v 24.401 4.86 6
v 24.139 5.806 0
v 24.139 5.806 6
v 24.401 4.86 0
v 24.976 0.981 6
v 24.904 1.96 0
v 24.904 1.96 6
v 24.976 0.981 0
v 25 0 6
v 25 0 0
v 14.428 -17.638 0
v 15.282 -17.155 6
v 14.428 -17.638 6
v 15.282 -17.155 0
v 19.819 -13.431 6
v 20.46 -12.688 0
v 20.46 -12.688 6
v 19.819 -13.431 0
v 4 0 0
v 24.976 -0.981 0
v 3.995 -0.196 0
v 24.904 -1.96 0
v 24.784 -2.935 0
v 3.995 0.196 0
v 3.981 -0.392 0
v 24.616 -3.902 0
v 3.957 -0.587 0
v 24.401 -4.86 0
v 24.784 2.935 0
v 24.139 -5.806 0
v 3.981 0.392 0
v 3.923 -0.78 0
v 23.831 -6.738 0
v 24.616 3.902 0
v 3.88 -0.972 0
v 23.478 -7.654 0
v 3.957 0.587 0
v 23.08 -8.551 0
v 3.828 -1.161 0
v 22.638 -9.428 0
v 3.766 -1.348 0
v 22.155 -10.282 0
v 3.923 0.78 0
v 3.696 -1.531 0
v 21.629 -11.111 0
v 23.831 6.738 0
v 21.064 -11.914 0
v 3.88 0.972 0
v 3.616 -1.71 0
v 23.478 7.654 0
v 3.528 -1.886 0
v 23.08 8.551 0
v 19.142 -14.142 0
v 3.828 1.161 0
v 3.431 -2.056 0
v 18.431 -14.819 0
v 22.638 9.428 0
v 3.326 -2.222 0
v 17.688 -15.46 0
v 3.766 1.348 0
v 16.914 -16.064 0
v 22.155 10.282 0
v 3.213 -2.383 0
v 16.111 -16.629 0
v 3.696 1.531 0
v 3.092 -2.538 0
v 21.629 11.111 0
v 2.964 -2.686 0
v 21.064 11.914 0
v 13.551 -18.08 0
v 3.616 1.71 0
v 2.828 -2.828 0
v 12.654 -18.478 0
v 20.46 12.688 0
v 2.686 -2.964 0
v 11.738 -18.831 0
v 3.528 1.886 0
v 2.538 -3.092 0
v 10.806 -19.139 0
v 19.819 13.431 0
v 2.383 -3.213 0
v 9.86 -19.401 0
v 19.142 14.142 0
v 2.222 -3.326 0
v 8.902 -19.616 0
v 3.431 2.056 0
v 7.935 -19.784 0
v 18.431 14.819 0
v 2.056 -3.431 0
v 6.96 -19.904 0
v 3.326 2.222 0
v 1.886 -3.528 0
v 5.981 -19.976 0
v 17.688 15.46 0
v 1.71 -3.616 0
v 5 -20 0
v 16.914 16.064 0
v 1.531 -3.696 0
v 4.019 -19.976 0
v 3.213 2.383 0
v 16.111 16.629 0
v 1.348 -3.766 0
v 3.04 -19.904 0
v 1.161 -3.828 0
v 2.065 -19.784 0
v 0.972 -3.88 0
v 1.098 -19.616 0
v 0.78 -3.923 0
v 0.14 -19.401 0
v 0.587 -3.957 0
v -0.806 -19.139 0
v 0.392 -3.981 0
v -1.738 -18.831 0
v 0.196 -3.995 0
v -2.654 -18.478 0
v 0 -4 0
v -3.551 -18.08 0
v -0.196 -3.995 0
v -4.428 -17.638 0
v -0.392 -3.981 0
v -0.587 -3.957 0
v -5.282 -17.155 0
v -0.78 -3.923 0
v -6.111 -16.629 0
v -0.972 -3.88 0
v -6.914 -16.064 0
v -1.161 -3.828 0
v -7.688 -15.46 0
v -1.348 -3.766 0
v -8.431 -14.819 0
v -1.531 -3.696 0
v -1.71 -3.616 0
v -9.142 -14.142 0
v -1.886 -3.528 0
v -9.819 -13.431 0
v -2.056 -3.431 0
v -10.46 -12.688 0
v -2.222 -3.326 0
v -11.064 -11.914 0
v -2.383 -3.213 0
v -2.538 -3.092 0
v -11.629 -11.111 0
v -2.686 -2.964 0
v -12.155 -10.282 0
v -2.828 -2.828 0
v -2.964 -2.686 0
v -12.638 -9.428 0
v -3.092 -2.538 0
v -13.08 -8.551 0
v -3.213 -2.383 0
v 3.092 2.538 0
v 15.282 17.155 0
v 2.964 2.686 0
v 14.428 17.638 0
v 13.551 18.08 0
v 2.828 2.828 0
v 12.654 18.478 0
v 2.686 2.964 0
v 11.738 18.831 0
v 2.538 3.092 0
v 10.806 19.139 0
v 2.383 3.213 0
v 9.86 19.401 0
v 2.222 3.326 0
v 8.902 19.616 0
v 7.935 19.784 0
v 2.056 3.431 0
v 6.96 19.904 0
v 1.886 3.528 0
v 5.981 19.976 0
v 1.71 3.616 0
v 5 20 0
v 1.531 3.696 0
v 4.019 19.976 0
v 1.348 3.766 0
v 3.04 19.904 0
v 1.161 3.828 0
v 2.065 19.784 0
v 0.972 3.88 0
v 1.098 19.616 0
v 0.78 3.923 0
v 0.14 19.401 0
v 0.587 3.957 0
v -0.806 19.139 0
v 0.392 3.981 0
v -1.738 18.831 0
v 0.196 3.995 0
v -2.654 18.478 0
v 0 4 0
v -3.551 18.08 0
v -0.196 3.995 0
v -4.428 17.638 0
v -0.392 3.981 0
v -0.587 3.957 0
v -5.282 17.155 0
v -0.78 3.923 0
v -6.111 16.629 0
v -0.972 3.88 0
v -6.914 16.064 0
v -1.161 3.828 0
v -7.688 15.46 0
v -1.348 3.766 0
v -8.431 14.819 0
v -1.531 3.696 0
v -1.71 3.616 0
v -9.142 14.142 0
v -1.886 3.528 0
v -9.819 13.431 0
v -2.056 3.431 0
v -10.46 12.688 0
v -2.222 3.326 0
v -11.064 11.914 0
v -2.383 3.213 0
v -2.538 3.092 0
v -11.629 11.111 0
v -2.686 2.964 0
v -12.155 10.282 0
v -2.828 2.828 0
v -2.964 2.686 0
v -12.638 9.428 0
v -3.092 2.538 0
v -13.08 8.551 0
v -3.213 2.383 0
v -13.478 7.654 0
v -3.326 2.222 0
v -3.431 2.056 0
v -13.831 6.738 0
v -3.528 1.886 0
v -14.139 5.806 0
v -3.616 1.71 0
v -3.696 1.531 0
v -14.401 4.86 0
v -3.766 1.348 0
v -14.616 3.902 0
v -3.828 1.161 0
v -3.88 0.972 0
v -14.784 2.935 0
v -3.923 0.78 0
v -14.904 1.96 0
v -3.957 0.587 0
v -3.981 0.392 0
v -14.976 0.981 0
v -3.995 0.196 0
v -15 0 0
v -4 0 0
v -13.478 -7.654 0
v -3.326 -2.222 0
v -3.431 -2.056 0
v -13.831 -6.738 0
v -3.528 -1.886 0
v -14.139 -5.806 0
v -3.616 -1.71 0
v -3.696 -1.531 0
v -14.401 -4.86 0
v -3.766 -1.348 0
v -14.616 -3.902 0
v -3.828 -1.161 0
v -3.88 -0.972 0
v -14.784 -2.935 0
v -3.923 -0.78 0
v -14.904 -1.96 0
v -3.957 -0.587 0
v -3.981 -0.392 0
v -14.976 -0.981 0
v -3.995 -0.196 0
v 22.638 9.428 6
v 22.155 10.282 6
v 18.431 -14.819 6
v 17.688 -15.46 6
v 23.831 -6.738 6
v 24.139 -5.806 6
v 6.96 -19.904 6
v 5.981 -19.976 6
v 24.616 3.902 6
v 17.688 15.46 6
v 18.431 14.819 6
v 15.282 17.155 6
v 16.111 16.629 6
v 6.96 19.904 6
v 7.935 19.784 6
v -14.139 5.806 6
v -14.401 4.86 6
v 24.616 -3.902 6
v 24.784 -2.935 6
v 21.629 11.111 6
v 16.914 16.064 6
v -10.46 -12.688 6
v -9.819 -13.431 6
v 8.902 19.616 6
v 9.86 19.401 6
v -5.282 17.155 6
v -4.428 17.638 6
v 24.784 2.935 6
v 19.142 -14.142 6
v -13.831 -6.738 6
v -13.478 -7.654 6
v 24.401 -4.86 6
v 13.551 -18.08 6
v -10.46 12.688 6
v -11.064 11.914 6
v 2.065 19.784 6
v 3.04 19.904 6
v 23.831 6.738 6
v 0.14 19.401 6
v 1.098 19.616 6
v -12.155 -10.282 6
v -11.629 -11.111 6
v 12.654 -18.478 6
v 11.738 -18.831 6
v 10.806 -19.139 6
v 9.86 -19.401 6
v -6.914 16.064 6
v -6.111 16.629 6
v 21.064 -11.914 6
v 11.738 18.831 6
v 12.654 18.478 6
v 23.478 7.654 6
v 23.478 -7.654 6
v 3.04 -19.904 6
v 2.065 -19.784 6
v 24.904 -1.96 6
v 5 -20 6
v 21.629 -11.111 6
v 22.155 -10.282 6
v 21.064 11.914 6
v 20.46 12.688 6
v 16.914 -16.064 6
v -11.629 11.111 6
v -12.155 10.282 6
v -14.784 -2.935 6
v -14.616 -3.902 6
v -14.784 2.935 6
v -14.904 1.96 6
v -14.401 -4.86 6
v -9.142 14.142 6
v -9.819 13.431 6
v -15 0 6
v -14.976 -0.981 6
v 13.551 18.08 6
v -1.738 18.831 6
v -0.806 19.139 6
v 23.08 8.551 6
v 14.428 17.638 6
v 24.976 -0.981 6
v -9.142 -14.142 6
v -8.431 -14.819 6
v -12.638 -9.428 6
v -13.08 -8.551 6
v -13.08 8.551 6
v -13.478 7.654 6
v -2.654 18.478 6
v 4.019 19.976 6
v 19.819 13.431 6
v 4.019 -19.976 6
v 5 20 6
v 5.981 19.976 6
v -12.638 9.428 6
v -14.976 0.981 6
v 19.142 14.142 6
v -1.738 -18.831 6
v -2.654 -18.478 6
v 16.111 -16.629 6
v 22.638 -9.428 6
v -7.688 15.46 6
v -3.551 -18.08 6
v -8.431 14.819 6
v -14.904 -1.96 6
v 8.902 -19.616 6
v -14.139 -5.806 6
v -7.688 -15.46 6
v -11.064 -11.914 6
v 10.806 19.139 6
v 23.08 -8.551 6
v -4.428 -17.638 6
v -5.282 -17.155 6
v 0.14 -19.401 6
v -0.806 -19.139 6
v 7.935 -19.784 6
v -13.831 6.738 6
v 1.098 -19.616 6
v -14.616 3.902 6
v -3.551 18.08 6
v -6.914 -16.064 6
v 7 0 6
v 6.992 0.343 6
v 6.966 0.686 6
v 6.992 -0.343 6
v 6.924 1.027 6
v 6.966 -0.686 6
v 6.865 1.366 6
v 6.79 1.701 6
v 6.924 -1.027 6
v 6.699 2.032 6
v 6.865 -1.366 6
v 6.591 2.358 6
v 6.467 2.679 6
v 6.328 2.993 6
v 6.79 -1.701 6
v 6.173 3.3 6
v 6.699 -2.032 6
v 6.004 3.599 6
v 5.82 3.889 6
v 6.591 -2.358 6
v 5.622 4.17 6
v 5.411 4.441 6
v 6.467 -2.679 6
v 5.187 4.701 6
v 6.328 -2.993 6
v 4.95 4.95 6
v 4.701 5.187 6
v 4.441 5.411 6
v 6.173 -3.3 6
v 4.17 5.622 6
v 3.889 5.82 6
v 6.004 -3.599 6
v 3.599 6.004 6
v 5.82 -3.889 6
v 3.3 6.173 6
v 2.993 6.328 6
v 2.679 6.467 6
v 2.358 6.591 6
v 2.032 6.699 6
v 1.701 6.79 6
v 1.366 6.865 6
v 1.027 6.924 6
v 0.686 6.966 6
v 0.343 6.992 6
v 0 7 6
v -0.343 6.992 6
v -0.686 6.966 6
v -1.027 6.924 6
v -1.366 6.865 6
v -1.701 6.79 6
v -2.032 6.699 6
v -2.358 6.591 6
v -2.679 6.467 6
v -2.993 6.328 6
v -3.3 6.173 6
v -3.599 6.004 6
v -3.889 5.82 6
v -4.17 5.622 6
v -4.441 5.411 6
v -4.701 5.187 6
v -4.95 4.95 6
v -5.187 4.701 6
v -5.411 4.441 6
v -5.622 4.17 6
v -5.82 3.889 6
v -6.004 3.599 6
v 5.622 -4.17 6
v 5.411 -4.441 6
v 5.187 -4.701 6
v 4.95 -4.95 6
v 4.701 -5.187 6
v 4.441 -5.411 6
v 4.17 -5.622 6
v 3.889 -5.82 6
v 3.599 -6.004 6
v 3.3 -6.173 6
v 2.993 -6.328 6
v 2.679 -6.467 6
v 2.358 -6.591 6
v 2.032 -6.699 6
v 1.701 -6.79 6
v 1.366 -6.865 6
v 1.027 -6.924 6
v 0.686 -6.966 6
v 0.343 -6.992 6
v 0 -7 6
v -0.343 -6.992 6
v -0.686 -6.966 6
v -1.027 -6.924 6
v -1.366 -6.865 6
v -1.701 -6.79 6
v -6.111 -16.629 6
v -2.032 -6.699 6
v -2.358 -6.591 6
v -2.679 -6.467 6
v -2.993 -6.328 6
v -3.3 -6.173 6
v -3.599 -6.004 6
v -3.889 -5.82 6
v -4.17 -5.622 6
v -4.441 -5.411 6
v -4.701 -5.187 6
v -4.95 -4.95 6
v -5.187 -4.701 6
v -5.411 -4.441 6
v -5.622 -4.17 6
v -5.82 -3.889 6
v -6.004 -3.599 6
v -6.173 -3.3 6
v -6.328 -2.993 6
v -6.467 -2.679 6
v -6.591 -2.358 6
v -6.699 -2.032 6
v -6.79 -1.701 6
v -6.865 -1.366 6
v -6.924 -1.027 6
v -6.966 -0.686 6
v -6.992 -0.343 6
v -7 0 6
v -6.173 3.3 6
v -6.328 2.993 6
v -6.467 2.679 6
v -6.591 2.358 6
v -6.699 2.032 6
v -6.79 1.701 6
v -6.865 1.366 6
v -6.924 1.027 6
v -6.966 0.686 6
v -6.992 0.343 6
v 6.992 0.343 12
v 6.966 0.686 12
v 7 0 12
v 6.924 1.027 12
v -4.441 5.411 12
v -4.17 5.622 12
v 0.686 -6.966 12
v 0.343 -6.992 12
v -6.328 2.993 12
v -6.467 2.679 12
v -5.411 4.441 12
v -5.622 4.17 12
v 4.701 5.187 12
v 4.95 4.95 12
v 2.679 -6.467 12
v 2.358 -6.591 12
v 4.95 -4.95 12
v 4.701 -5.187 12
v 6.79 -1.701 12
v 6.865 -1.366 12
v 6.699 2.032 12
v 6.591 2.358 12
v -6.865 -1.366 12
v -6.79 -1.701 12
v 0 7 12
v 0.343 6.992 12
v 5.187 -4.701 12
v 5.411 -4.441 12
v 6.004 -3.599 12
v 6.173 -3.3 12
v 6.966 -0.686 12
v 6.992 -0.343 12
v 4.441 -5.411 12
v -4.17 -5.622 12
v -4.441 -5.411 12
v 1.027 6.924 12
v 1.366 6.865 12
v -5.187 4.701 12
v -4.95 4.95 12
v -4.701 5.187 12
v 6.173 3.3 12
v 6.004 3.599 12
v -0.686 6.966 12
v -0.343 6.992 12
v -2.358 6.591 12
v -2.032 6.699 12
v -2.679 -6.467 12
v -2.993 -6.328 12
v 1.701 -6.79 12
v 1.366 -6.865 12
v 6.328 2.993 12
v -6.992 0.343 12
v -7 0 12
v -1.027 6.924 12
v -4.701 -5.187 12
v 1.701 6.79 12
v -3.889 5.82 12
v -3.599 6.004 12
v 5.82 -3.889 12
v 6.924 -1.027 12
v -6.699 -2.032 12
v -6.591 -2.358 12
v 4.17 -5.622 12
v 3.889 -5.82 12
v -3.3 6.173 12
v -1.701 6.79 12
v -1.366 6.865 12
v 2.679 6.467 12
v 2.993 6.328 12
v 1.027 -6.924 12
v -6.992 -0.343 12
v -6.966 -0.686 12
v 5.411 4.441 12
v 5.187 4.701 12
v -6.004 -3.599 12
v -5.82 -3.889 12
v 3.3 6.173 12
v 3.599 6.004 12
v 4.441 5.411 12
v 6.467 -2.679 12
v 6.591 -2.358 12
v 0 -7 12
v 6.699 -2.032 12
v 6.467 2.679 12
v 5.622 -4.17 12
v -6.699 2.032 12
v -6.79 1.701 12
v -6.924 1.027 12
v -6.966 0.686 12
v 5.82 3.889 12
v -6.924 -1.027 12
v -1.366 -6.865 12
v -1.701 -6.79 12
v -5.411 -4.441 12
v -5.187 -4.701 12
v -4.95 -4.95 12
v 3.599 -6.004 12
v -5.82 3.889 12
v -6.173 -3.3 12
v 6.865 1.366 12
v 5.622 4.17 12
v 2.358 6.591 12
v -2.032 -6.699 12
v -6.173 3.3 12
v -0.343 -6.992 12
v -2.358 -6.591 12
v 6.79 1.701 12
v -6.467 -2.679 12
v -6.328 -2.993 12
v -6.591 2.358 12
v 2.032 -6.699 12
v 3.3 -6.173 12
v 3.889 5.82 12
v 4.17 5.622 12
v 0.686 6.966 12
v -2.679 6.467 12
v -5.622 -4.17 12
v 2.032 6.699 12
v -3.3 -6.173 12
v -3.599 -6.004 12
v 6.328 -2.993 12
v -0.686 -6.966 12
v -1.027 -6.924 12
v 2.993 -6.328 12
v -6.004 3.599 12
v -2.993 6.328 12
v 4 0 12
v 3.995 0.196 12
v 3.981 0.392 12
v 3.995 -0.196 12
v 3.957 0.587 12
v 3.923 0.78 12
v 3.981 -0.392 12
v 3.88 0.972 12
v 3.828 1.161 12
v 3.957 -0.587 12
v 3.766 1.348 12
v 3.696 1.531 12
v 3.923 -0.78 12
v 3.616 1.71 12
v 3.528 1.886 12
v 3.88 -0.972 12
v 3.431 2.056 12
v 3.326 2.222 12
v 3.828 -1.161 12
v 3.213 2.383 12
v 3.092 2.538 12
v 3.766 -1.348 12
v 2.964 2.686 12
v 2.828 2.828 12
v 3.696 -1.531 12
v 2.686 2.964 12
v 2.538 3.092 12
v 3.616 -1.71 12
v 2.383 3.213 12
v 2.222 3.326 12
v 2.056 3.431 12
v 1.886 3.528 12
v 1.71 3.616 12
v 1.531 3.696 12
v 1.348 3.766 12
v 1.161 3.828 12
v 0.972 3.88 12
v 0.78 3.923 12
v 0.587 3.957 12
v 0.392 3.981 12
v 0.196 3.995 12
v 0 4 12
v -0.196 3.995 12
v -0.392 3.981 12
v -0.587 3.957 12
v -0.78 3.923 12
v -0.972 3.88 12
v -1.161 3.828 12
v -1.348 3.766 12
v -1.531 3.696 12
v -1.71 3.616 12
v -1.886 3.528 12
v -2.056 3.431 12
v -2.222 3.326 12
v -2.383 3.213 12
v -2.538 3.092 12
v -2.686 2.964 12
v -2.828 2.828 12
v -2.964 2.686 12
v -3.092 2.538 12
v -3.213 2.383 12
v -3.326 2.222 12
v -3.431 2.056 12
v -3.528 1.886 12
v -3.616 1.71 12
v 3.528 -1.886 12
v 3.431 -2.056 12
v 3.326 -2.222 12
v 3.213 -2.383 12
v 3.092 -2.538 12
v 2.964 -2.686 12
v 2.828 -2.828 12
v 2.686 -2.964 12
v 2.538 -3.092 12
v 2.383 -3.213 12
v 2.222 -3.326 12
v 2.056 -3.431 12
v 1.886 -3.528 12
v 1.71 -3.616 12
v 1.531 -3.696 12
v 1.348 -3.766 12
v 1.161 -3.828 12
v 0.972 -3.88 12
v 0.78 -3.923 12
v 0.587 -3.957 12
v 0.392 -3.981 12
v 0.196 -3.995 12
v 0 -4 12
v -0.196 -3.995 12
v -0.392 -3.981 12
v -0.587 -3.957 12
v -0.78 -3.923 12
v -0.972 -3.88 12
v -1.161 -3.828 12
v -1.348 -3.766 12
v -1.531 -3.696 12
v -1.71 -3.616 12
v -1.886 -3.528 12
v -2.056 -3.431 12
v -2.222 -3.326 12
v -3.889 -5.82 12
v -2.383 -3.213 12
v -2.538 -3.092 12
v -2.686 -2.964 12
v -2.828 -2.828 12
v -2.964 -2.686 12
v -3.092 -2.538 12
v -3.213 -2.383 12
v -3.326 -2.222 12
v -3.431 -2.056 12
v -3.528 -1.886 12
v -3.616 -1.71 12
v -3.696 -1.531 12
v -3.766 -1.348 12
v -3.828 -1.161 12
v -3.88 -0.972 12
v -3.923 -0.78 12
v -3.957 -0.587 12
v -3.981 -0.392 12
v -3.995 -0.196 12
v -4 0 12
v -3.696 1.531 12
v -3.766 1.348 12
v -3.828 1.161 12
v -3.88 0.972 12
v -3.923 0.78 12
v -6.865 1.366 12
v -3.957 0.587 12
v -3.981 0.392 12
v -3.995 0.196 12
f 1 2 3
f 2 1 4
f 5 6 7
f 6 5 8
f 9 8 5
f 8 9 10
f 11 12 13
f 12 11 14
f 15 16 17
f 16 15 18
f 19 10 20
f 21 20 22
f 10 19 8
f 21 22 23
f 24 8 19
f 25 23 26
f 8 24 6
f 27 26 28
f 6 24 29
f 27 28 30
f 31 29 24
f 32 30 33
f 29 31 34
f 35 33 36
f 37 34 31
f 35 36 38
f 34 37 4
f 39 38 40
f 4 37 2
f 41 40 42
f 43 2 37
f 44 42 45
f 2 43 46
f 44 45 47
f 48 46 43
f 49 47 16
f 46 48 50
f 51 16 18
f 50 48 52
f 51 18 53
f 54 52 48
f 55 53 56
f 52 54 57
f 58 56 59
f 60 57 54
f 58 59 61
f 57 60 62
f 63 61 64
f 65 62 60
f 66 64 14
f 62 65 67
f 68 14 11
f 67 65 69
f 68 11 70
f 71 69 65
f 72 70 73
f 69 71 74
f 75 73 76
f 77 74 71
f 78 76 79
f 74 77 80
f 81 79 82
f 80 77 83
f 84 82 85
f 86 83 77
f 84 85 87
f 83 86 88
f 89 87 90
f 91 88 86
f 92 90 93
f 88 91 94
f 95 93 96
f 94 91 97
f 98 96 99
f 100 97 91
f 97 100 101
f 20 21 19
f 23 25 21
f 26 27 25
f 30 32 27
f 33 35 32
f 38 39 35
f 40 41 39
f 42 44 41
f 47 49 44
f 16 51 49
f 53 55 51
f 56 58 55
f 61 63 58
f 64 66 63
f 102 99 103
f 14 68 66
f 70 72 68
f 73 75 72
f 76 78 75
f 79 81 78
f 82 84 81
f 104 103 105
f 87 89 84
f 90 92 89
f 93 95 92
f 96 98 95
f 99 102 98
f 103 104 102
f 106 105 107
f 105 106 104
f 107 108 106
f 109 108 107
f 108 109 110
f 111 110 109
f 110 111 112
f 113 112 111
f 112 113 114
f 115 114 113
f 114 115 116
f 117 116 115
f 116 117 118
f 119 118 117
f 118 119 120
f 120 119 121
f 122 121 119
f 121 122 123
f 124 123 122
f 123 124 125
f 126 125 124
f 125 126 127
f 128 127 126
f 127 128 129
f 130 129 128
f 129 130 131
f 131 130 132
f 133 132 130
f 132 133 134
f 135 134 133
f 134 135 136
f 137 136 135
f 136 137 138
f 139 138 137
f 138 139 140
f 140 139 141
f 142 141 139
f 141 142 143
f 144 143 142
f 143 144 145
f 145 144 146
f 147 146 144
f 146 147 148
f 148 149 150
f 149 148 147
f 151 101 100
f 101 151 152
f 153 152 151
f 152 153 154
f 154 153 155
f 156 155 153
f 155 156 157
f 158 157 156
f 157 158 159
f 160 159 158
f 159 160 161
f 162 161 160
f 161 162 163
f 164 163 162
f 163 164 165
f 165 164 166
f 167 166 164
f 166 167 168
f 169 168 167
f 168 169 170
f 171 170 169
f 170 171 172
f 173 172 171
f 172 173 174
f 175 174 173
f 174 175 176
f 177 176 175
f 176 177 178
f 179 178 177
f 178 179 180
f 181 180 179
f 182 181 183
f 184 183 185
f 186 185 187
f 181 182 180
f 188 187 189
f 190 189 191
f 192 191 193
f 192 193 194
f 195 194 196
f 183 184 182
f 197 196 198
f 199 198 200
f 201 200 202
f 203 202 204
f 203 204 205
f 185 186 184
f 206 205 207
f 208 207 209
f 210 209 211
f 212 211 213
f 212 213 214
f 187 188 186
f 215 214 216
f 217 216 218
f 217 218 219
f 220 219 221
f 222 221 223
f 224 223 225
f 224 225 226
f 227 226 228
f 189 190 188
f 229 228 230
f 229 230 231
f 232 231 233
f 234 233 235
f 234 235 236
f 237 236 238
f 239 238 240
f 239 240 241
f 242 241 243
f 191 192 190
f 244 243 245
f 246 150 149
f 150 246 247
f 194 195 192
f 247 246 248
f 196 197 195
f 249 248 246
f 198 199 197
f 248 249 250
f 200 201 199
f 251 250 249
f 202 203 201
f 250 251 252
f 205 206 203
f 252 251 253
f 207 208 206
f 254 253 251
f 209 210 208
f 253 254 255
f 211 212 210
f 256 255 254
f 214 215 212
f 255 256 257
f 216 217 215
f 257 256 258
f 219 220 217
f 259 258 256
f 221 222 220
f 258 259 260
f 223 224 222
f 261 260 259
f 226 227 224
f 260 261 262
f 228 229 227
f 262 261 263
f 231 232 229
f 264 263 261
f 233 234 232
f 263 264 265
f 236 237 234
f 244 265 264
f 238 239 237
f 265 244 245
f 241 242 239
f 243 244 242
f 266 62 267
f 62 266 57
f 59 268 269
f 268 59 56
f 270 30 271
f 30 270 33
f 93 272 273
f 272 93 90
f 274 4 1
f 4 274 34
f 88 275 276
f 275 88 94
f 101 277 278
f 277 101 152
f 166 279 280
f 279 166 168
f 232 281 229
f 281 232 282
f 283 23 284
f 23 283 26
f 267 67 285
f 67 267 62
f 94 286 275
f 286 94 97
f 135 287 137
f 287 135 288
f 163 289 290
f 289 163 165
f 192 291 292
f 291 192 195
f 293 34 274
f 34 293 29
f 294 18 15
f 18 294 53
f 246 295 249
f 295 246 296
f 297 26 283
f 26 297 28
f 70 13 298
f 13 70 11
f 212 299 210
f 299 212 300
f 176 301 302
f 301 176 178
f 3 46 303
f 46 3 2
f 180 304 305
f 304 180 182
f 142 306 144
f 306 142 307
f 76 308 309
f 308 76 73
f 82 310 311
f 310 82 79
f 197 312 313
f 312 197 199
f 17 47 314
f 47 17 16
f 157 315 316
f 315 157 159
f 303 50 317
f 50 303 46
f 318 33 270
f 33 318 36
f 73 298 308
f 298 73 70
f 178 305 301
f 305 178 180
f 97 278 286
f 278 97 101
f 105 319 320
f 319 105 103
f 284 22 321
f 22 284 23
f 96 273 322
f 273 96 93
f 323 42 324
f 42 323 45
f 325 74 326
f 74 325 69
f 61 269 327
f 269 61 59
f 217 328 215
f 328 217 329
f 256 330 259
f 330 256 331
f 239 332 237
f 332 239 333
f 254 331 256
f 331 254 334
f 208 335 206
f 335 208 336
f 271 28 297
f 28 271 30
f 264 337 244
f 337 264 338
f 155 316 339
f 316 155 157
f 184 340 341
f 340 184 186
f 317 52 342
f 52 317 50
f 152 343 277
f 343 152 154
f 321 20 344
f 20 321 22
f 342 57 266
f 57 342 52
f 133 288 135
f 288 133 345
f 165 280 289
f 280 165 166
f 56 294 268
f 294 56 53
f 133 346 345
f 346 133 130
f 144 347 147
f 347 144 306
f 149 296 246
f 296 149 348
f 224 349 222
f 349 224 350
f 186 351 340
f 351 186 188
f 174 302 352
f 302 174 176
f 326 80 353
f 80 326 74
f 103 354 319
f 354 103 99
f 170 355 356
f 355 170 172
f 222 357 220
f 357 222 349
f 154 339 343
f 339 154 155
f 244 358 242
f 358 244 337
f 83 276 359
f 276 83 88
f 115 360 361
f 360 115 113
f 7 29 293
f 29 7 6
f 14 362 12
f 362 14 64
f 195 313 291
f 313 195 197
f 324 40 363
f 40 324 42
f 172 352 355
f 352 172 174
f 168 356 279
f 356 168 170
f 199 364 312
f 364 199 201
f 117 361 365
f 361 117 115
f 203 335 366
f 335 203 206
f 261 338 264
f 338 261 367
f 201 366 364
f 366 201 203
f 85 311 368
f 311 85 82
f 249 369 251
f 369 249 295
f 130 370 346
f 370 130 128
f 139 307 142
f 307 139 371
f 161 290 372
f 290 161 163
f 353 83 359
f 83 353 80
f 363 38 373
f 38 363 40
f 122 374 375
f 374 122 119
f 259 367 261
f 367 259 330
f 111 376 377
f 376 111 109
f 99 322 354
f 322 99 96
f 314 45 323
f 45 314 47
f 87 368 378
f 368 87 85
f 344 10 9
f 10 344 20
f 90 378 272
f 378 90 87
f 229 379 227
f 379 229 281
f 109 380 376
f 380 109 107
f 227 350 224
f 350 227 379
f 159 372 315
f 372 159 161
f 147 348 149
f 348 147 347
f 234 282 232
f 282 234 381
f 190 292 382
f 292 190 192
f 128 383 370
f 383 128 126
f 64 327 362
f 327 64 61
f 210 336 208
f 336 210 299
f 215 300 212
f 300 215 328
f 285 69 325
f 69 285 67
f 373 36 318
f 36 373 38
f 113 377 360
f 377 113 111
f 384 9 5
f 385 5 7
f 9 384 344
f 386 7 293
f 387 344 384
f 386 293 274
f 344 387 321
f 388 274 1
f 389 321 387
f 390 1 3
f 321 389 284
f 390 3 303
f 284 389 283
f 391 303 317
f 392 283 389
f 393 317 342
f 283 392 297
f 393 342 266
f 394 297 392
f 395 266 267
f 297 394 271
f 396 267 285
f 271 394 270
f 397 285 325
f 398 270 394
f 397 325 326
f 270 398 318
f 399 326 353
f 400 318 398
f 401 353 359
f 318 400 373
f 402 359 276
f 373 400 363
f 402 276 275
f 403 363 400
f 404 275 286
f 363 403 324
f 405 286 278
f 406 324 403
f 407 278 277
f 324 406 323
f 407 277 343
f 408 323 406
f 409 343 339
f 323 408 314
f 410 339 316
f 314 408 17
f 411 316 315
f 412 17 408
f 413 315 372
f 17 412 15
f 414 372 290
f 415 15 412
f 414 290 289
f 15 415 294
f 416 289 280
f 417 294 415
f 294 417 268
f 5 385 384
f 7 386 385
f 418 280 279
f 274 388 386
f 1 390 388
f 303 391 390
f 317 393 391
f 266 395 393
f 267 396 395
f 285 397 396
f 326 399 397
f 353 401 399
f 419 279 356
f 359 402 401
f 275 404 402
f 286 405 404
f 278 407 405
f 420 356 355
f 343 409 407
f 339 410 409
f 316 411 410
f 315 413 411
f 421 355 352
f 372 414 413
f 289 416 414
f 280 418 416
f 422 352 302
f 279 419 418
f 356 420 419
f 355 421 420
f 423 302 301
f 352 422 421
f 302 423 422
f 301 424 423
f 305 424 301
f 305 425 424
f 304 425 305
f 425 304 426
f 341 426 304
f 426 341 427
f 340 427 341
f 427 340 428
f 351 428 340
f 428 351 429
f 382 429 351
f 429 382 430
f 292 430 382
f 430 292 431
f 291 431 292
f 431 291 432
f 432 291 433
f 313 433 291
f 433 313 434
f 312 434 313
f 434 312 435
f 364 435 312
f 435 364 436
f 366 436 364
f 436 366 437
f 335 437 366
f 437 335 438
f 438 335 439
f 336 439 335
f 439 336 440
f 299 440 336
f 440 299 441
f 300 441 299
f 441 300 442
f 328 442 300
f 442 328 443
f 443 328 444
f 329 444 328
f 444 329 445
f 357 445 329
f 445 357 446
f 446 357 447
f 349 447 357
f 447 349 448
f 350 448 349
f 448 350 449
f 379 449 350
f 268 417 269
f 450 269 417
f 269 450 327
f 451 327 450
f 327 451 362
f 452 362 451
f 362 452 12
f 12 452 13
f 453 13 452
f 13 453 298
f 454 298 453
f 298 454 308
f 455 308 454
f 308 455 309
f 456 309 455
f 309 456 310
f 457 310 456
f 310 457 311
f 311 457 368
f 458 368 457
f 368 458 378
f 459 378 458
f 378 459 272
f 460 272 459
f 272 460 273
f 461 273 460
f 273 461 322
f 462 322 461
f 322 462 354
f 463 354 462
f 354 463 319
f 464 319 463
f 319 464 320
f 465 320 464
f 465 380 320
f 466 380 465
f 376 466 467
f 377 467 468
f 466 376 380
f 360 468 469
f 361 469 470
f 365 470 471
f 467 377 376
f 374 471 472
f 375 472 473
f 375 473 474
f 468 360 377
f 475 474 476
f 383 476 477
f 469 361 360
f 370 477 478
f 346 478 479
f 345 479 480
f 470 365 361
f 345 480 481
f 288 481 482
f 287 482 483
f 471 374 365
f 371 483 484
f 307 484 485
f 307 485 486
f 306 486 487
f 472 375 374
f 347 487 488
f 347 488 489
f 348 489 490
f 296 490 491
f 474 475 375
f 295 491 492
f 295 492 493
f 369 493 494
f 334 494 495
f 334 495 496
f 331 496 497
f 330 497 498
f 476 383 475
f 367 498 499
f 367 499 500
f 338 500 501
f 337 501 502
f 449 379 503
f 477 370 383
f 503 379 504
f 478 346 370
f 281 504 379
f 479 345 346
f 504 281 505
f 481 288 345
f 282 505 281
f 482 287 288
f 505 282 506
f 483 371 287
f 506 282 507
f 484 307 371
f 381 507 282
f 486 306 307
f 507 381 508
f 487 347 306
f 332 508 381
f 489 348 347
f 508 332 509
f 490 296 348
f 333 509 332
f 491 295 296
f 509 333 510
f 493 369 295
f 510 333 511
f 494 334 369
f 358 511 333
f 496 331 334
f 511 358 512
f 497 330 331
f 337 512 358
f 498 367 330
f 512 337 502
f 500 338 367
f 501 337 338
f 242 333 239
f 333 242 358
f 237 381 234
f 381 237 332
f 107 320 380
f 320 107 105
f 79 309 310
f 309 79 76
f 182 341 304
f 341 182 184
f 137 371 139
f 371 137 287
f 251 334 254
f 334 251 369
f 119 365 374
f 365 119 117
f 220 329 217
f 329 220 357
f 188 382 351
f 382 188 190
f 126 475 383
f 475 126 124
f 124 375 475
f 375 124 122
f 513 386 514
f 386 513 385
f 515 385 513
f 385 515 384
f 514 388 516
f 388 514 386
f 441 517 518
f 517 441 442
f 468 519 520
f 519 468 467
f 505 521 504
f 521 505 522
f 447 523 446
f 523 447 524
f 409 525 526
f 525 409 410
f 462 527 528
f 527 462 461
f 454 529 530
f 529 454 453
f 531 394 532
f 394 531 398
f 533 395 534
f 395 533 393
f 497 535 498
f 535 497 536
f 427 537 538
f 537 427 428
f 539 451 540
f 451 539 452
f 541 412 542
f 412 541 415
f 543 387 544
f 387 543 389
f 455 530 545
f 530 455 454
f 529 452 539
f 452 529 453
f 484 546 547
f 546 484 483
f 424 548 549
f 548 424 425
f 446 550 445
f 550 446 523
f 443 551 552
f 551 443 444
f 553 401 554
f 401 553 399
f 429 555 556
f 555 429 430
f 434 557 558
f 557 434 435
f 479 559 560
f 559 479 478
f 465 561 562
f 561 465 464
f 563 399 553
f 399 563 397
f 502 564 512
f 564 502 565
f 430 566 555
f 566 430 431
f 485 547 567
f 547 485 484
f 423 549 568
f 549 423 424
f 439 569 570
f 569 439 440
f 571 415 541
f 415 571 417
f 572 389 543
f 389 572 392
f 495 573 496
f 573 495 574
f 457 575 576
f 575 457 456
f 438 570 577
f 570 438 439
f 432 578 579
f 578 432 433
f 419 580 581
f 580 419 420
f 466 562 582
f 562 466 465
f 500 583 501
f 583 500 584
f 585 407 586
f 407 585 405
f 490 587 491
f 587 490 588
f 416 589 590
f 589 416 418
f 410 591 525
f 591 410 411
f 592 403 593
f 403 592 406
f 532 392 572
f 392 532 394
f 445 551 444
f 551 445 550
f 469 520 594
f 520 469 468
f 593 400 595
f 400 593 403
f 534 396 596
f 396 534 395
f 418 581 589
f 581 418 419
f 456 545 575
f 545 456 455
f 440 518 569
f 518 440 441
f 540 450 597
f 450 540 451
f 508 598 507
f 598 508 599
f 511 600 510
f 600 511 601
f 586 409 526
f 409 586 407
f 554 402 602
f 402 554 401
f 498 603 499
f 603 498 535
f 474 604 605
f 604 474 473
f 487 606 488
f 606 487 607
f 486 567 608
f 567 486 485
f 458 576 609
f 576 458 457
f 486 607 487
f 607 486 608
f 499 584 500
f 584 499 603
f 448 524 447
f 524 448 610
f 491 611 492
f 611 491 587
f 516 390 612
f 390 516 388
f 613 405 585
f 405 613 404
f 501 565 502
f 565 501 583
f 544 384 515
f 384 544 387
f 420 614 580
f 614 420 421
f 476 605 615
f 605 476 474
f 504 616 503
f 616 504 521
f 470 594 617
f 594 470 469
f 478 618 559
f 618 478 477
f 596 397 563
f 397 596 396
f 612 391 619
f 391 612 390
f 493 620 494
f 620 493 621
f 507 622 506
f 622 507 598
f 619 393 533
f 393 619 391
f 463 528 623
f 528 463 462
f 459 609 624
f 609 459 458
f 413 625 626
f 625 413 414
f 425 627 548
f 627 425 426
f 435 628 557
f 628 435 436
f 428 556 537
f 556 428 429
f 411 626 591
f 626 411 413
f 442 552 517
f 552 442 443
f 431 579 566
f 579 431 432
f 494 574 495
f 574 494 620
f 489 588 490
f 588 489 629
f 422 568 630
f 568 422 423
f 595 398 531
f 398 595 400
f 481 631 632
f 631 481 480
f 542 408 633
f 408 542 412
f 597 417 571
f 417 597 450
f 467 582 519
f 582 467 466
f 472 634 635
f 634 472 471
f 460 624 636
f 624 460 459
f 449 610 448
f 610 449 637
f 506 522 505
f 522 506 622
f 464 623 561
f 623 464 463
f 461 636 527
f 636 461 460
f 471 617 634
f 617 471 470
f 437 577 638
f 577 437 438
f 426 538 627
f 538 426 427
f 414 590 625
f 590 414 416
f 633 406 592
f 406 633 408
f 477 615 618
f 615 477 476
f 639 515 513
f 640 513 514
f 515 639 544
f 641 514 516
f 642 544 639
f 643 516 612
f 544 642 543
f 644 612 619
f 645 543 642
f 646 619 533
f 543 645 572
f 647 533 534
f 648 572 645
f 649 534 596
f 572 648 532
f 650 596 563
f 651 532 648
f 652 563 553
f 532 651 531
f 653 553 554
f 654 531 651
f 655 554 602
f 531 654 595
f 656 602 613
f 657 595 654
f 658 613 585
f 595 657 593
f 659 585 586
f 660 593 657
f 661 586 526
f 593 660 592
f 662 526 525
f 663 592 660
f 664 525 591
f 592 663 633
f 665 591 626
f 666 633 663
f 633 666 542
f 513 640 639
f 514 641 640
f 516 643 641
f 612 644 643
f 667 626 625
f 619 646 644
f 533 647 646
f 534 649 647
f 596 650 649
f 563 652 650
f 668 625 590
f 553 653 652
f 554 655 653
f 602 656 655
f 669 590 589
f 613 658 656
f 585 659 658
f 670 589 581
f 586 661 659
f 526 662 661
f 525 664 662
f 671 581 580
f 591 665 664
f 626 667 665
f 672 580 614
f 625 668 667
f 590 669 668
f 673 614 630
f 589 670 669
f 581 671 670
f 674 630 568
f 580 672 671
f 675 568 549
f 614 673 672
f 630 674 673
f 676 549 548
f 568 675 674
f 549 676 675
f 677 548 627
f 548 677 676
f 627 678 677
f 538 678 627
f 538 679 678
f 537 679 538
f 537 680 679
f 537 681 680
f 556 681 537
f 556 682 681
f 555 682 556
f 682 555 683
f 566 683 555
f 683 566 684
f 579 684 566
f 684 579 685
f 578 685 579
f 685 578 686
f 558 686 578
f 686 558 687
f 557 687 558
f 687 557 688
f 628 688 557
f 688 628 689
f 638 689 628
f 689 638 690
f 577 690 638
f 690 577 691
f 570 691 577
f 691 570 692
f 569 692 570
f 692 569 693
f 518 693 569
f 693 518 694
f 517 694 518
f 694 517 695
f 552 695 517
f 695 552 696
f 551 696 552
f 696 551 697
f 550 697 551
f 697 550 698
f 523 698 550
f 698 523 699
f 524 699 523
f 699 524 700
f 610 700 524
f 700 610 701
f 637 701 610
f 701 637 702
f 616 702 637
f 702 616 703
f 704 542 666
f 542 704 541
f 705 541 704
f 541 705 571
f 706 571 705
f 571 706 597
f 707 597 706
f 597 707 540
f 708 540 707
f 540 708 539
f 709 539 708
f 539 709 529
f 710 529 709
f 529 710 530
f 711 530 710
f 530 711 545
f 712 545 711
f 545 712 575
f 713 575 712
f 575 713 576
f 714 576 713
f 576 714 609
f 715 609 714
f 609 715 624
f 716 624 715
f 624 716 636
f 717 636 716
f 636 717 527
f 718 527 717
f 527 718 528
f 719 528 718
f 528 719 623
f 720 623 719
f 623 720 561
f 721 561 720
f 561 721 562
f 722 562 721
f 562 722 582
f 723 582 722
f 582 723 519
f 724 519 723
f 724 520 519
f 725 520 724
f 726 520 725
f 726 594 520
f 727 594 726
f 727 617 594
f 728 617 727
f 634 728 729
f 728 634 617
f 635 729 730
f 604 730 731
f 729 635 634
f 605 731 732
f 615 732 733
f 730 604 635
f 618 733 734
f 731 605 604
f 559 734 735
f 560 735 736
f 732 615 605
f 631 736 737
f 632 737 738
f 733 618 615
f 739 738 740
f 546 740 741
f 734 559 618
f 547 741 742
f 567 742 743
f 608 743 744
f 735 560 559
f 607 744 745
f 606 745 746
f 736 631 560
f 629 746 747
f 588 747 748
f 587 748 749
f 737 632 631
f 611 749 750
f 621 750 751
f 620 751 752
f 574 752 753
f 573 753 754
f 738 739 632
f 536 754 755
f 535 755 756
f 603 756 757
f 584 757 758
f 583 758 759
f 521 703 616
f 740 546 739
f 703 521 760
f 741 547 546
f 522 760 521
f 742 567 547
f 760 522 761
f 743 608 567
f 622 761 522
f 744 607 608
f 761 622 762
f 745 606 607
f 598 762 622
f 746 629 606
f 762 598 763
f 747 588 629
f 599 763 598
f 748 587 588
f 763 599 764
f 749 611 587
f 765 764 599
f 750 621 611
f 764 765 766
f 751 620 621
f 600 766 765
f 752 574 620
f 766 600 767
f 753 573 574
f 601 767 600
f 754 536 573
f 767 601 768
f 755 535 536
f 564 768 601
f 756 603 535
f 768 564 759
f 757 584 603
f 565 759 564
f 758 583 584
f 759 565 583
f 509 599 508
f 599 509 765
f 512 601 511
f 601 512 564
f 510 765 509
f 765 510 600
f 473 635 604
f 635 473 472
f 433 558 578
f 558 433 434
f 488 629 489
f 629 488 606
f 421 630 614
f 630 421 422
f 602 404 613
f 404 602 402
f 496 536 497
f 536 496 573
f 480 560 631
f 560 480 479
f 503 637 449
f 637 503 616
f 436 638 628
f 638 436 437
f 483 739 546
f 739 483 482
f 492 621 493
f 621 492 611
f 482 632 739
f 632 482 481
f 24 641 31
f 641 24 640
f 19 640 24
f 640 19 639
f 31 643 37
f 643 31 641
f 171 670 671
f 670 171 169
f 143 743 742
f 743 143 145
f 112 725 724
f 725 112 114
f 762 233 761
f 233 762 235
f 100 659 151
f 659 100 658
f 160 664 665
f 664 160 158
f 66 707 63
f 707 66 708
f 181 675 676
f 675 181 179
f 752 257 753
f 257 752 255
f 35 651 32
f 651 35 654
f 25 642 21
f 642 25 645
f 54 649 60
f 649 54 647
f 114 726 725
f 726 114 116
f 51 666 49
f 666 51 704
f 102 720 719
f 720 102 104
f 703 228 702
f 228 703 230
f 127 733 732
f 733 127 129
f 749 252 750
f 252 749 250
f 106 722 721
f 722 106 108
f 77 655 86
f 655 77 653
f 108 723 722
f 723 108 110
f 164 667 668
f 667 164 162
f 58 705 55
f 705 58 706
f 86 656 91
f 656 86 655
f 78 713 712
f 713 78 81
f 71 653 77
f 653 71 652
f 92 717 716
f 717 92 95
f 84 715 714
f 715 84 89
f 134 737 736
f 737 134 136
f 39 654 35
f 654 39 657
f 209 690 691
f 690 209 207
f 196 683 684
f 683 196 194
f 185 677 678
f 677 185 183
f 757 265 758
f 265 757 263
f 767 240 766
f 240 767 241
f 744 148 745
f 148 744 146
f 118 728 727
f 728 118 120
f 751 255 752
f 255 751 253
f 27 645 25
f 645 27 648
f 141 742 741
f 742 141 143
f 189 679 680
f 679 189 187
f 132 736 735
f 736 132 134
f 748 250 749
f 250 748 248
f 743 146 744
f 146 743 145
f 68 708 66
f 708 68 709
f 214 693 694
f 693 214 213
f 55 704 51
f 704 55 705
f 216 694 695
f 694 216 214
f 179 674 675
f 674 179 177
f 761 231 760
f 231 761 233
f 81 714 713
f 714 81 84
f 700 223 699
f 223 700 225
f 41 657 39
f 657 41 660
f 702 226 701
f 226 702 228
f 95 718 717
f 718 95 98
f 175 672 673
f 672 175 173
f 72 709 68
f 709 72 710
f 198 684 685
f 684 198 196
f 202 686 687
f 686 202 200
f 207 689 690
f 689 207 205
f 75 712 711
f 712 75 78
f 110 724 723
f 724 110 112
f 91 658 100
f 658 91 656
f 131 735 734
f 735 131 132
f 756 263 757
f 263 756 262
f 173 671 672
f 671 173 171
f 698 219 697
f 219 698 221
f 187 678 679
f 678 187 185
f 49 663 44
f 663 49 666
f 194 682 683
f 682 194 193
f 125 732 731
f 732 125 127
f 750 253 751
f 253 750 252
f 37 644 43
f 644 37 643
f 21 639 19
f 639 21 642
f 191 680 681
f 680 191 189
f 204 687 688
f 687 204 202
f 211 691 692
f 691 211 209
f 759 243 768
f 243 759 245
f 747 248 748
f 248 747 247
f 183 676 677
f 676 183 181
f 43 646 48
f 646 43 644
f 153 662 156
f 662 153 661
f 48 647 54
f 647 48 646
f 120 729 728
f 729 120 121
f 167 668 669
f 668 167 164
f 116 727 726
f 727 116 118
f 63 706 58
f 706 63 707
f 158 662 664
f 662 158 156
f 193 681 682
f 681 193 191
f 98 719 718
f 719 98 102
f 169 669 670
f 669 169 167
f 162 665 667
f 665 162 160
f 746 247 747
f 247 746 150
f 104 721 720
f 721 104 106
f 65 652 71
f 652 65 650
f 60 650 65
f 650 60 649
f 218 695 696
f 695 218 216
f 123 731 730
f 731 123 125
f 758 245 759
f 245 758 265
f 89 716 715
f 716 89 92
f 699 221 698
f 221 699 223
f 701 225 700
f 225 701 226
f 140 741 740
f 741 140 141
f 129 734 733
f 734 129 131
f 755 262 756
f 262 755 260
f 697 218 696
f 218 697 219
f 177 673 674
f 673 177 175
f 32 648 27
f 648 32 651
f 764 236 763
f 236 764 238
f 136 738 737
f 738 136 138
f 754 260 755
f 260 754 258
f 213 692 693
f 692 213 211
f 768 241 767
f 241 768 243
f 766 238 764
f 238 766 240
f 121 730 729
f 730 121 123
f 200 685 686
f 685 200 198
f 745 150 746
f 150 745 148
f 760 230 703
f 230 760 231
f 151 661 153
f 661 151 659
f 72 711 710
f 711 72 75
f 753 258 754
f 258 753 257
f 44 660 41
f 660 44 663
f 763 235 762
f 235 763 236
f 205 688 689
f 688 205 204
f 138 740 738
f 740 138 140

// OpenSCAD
// Eccentric cam for shaker mechanism
// Print orientation: disc flat on bed (z = 0), hub builds upward.
// Shaft axis = Z axis (x = 0, y = 0); disc centre offset in +X.

// ---------------- Parameters ----------------
disc_d      = 40;   // cam disc diameter
disc_t      = 6;    // cam disc thickness (z = 0 .. 6)
eccentric   = 5;    // offset of disc centre from shaft axis (along X)
hub_d       = 14;   // hub diameter (on shaft axis)
hub_h       = 6;    // hub height above disc (z = 6 .. 12)
shaft_d     = 8;    // shaft hole diameter (through hub and disc)
eps         = 0.5;  // overcut for clean boolean differences
$fn         = 128;  // circle resolution

// ---------------- Model ----------------
difference() {
    union() {
        // Eccentric disc
        translate([eccentric, 0, 0])
            cylinder(d = disc_d, h = disc_t);

        // Hub on shaft axis, overlapping slightly into disc for a solid union
        translate([0, 0, disc_t - 0.01])
            cylinder(d = hub_d, h = hub_h + 0.01);
    }

    // Shaft hole through hub and disc on the Z axis
    translate([0, 0, -eps])
        cylinder(d = shaft_d, h = disc_t + hub_h + 2 * eps);
}
